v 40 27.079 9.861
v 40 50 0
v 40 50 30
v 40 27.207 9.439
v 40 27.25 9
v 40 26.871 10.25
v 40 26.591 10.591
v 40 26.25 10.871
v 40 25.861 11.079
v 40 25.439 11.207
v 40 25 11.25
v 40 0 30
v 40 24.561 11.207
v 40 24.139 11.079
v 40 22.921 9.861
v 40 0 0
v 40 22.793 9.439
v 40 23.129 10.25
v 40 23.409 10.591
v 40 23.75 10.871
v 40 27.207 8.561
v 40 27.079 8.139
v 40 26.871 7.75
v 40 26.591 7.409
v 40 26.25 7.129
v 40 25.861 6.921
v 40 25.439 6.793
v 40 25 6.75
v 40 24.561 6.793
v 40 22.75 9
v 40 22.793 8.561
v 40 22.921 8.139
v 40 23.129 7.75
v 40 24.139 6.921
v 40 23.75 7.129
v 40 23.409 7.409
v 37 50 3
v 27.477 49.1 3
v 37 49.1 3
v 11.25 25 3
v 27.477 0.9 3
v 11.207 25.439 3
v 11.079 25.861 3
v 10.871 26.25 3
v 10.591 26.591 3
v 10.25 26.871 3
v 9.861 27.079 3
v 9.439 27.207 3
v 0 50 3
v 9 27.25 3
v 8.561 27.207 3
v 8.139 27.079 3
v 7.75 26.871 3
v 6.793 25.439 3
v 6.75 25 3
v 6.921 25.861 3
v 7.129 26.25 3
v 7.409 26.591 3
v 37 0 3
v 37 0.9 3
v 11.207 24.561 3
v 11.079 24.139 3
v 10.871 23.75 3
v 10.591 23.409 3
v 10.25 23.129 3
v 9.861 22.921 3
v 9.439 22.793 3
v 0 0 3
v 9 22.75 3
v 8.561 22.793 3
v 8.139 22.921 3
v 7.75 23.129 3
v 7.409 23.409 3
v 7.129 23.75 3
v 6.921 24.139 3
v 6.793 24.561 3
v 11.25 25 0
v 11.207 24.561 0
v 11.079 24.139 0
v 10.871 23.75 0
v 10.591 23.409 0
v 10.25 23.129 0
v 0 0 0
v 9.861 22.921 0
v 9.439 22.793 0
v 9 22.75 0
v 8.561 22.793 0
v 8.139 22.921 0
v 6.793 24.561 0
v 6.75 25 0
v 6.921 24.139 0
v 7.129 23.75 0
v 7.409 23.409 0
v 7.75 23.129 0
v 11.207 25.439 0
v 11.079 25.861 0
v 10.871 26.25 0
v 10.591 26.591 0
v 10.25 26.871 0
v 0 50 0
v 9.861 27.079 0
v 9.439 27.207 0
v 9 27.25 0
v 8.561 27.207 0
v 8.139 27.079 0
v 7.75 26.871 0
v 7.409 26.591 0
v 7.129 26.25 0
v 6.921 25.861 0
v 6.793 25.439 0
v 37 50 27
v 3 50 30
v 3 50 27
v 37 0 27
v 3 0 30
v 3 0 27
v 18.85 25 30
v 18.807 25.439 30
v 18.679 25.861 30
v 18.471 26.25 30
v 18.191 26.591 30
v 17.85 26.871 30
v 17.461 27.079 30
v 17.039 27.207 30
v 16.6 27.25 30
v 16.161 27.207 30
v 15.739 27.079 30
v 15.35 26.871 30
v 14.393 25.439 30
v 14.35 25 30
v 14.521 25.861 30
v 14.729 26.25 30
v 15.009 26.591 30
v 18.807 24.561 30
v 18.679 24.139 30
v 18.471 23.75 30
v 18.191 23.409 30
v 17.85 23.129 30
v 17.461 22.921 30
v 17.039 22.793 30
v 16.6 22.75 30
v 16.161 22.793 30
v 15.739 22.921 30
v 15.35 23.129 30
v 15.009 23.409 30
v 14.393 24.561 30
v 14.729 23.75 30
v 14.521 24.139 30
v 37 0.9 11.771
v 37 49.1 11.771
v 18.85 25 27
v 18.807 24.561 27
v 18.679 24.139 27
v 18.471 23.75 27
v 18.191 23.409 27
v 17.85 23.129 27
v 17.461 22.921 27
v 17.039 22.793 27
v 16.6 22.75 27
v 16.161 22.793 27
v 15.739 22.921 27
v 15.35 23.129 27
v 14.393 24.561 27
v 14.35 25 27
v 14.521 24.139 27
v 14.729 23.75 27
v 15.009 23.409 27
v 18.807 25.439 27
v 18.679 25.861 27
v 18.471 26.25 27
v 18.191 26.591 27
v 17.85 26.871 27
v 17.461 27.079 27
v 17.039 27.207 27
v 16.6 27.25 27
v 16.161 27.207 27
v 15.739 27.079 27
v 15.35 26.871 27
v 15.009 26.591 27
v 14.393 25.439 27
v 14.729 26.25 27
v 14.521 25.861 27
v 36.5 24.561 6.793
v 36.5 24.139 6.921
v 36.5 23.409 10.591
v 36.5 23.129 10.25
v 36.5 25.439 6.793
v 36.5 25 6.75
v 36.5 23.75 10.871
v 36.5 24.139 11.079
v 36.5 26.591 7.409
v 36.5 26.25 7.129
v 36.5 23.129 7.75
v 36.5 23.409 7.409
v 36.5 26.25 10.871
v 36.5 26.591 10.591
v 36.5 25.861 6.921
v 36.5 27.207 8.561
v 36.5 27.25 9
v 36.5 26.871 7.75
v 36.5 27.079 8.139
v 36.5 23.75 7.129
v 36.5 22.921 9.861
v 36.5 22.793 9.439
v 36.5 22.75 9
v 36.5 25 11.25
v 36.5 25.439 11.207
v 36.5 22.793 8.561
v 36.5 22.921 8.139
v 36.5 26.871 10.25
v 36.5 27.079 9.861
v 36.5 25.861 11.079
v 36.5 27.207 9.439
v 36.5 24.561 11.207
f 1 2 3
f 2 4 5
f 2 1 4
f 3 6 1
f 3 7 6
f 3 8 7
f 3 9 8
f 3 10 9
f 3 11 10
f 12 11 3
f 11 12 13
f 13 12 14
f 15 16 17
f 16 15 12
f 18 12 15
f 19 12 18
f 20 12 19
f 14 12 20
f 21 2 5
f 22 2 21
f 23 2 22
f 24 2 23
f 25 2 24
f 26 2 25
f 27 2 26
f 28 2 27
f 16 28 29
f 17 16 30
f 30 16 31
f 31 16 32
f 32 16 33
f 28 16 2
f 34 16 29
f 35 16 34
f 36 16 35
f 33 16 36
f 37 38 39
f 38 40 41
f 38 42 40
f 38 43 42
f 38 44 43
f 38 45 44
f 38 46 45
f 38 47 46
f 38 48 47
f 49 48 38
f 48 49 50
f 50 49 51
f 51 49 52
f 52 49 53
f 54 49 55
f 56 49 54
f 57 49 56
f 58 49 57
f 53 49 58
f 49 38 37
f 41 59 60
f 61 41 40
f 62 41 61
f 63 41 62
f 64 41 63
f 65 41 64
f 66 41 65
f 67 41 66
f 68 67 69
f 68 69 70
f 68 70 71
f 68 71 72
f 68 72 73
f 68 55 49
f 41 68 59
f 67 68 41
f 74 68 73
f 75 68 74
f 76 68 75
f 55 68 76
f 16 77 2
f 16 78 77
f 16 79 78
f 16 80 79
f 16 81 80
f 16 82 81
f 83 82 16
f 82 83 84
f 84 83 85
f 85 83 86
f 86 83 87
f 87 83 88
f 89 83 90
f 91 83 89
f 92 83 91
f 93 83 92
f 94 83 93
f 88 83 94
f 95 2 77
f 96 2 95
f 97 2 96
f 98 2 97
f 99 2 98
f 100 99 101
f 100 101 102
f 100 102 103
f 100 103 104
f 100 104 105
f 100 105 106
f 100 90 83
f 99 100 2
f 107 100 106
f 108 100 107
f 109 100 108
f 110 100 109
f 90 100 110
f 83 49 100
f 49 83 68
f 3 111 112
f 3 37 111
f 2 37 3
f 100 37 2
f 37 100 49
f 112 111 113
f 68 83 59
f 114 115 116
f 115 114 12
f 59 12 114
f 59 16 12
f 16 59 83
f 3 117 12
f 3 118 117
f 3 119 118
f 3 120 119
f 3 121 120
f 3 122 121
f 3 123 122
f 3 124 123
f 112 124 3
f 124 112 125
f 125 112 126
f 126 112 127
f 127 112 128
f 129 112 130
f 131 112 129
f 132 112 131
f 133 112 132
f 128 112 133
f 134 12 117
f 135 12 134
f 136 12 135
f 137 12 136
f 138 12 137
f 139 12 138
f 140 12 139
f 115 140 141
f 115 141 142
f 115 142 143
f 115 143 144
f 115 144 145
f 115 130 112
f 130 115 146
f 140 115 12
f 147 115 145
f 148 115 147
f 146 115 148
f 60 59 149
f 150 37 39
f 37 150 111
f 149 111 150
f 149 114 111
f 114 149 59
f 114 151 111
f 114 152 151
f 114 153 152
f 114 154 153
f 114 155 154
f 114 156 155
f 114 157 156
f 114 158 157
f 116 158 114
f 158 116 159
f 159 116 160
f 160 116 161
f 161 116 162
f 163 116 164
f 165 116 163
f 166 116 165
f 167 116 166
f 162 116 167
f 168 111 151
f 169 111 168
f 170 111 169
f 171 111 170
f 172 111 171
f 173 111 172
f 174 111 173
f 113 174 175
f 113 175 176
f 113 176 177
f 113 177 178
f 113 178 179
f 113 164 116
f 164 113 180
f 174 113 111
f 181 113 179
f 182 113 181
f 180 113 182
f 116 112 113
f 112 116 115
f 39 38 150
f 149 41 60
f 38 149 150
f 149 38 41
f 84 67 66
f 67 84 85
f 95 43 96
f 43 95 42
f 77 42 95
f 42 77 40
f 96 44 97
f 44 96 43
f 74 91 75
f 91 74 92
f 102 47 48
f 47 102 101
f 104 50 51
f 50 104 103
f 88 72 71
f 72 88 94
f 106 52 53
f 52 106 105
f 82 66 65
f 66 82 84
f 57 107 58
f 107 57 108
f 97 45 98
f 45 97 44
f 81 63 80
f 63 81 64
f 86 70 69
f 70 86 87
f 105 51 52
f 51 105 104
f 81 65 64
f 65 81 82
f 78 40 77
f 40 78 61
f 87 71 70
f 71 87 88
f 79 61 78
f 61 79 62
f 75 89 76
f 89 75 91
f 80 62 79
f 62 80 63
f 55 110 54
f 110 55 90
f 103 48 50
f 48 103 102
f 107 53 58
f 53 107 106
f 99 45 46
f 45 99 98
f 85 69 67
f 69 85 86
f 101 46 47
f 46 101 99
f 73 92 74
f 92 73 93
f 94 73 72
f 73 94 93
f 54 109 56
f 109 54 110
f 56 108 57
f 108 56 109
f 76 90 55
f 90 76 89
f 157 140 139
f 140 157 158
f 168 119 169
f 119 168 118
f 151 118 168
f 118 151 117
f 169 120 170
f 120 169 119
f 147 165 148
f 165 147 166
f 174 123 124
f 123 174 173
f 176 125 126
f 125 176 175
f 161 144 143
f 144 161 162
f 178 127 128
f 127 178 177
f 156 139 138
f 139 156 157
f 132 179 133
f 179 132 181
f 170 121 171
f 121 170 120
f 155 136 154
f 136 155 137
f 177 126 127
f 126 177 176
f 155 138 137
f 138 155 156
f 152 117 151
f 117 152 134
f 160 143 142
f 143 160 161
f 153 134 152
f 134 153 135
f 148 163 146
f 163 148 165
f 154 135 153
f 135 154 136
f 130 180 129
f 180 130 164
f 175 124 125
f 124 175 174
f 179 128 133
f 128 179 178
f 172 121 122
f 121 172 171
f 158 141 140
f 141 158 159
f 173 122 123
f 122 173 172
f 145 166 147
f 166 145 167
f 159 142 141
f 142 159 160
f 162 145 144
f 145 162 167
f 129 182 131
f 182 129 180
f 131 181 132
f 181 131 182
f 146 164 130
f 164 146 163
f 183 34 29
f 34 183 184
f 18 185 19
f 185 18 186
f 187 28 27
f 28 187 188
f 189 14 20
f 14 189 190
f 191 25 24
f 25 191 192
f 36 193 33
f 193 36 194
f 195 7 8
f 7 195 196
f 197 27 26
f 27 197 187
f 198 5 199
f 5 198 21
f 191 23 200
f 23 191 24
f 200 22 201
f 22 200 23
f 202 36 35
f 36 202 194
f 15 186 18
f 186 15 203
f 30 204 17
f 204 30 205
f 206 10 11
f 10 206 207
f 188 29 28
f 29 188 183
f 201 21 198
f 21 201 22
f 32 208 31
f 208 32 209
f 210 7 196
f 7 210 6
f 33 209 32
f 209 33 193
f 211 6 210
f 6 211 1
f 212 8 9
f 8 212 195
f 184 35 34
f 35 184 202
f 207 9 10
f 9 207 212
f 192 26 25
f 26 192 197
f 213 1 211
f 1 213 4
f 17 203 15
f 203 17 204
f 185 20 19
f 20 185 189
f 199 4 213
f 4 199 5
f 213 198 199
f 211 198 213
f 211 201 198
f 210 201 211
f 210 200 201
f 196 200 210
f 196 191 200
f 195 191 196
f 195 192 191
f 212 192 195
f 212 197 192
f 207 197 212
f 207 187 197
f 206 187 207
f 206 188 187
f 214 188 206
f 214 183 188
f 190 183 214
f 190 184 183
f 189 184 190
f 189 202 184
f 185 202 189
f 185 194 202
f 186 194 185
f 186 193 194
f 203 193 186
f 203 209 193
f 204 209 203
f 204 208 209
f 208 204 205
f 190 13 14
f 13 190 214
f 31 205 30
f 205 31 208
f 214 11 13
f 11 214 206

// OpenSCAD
$fn = 32;

// ----------------------------------------------------------------------
// Z-bracket: 40 x 50 x 30 mm
// ----------------------------------------------------------------------

// --- parameters (mm) ---
lower_leg = 40;           // lower foot length, X
upper_leg = 34;           // upper foot length, X
bracket_w = 50;           // bracket width, Y
offset_h = 30;            // overall rise, Z
sheet_t = 3;              // plate thickness
hole_d = 4.5;             // clearance for M4
rib_len = 10.5;           // gusset leg
rib_sink = 0.9;           // gusset overlap into the plates

module hole_z(px, py, z0) {
  translate([px, py, z0 - 0.5]) cylinder(h = sheet_t + 1, d = hole_d);
}
module hole_x(py, pz) {
  translate([-0.5, py, pz]) rotate([0, 90, 0]) cylinder(h = sheet_t + 1, d = hole_d);
}
module gusset(x0) {
  translate([x0, bracket_w - rib_sink, 0])
    rotate([90, 0, 0])
      linear_extrude(height = bracket_w - 2 * rib_sink)
        polygon(points = [[rib_sink, sheet_t - rib_sink],
                          [rib_sink, sheet_t - rib_sink + rib_len],
                          [-rib_len, sheet_t - rib_sink]]);
}

difference() {
  union() {
    cube([lower_leg, bracket_w, sheet_t]);
    /* web, overlapping the lower foot */
    translate([lower_leg - sheet_t, 0, 0]) cube([sheet_t, bracket_w, offset_h]);
    /* upper foot, sunk into the web */
    translate([lower_leg - sheet_t - upper_leg, 0, offset_h - sheet_t]) cube([upper_leg + sheet_t, bracket_w, sheet_t]);
    gusset(lower_leg - sheet_t);
  }
  hole_z(9, 25, 0);
  translate([lower_leg - sheet_t - 20.4, 0, 0]) hole_z(0, 25, offset_h - sheet_t);
  translate([lower_leg - sheet_t, 0, 0]) hole_x(25, 9);
}
